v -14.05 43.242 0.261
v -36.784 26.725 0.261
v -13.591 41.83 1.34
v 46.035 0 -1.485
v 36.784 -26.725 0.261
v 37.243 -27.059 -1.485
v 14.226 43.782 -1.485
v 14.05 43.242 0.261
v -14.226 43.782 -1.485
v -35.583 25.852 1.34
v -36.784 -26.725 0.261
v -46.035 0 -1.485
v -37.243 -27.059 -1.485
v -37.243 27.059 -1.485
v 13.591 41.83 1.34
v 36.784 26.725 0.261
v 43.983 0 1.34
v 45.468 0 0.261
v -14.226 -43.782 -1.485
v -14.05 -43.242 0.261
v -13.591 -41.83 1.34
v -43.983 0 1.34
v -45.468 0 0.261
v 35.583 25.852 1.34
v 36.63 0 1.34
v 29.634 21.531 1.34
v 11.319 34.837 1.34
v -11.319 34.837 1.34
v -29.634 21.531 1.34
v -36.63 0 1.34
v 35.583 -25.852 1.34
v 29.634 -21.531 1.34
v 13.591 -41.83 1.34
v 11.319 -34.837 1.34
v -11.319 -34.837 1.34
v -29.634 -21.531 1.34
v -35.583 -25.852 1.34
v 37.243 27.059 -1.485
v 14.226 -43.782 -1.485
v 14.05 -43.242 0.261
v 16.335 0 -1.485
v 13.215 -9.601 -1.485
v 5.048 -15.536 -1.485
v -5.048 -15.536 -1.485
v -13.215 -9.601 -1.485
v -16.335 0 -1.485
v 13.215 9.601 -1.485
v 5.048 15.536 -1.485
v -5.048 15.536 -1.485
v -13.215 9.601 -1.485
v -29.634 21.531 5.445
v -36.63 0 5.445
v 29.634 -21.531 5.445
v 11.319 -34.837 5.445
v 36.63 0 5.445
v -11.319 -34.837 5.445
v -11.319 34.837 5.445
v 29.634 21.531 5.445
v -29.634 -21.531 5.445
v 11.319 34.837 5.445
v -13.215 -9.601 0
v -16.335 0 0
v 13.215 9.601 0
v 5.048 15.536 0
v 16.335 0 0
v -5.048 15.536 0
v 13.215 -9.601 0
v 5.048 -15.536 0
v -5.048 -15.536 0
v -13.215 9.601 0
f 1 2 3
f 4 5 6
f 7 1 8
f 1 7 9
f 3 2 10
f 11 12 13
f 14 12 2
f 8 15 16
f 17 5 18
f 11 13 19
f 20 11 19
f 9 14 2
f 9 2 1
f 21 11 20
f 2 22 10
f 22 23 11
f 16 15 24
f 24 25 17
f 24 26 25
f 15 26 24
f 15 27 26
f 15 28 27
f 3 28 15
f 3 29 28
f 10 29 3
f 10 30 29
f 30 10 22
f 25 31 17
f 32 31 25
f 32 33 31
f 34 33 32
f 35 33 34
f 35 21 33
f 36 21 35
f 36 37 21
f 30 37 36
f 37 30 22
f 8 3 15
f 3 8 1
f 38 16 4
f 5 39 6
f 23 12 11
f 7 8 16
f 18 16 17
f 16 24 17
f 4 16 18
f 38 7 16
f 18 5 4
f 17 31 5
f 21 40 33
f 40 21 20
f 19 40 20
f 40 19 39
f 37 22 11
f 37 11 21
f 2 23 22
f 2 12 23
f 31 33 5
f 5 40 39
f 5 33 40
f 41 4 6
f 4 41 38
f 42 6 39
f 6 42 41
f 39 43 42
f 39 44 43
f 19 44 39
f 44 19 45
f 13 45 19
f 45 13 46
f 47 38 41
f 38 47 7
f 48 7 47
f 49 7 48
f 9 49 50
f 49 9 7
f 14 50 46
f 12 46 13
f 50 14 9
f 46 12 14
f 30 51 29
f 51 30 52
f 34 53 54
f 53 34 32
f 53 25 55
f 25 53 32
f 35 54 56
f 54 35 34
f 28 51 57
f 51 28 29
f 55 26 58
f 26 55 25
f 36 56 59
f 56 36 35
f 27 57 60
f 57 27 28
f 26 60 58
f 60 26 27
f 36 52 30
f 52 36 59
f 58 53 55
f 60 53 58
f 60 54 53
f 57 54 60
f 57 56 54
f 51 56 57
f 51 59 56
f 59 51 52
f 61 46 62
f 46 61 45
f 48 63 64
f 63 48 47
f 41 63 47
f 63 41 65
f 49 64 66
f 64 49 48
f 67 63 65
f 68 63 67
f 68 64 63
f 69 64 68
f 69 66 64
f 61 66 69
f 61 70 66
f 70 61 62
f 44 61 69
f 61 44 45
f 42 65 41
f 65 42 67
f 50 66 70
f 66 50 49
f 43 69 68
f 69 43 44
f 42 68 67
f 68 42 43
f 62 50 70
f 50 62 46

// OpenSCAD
// file: constants.scad
$fn = 10;

burger_diameter = 100; // ~ 4in
burger_thickness = 20; // ~ 3/4ths inch
//
//
edge_rounding = 3;
//
wall_thickness = 5; // mm
//
insert_thickness = 4;
insert_lip = 3;
insert_diameter = burger_diameter-(3*(wall_thickness+edge_rounding));
//
press_disc_thickness = 5;

mold_height = press_disc_thickness + insert_thickness + (1.35*burger_thickness);
//
part_mating_fudge = -2; // subtract 2mm from objects that fit inside other objects.

press_support_pillars = 7;

module rcylinder(r1=10,r2=10,h=10,b=2) {
  translate([0,0,-h/2]) hull() {
    rotate_extrude() translate([r1-b,b,0]) circle(r = b); 
    rotate_extrude() translate([r2-b, h-b, 0]) circle(r = b);
  }
}
// main file
include <constants.scad>

// scale_size = 1;
// scale_size = 0.95;
scale_size = 0.99;
scale(v=[scale_size,scale_size,scale_size]) main();

module main() {
  difference() {
      translate([0,0,edge_rounding/2]) rotate([180,0,0]) union() {
      lip();
      translate([0,0,-wall_thickness+1]) insert();
    }
   translate([0,0,-2]) dent_plug();
  }
}

module dent_plug() {
  color("orange") cylinder(h=2, r=(part_mating_fudge+(0.35*burger_diameter))/2);
}

module insert() {
  cylinder(h = wall_thickness, r = (part_mating_fudge+insert_diameter)/2);
}

module lip() {
  difference() {
    color("red") translate([0,0,mold_height/2]) rcylinder(r1 = (part_mating_fudge+burger_diameter-wall_thickness)/2, r2 = (part_mating_fudge+burger_diameter-wall_thickness)/2, h = mold_height, b=edge_rounding);
    color("blue") translate([0,0,insert_lip]) cylinder(h=mold_height, r=(part_mating_fudge+burger_diameter)/2);
  }
}
  
